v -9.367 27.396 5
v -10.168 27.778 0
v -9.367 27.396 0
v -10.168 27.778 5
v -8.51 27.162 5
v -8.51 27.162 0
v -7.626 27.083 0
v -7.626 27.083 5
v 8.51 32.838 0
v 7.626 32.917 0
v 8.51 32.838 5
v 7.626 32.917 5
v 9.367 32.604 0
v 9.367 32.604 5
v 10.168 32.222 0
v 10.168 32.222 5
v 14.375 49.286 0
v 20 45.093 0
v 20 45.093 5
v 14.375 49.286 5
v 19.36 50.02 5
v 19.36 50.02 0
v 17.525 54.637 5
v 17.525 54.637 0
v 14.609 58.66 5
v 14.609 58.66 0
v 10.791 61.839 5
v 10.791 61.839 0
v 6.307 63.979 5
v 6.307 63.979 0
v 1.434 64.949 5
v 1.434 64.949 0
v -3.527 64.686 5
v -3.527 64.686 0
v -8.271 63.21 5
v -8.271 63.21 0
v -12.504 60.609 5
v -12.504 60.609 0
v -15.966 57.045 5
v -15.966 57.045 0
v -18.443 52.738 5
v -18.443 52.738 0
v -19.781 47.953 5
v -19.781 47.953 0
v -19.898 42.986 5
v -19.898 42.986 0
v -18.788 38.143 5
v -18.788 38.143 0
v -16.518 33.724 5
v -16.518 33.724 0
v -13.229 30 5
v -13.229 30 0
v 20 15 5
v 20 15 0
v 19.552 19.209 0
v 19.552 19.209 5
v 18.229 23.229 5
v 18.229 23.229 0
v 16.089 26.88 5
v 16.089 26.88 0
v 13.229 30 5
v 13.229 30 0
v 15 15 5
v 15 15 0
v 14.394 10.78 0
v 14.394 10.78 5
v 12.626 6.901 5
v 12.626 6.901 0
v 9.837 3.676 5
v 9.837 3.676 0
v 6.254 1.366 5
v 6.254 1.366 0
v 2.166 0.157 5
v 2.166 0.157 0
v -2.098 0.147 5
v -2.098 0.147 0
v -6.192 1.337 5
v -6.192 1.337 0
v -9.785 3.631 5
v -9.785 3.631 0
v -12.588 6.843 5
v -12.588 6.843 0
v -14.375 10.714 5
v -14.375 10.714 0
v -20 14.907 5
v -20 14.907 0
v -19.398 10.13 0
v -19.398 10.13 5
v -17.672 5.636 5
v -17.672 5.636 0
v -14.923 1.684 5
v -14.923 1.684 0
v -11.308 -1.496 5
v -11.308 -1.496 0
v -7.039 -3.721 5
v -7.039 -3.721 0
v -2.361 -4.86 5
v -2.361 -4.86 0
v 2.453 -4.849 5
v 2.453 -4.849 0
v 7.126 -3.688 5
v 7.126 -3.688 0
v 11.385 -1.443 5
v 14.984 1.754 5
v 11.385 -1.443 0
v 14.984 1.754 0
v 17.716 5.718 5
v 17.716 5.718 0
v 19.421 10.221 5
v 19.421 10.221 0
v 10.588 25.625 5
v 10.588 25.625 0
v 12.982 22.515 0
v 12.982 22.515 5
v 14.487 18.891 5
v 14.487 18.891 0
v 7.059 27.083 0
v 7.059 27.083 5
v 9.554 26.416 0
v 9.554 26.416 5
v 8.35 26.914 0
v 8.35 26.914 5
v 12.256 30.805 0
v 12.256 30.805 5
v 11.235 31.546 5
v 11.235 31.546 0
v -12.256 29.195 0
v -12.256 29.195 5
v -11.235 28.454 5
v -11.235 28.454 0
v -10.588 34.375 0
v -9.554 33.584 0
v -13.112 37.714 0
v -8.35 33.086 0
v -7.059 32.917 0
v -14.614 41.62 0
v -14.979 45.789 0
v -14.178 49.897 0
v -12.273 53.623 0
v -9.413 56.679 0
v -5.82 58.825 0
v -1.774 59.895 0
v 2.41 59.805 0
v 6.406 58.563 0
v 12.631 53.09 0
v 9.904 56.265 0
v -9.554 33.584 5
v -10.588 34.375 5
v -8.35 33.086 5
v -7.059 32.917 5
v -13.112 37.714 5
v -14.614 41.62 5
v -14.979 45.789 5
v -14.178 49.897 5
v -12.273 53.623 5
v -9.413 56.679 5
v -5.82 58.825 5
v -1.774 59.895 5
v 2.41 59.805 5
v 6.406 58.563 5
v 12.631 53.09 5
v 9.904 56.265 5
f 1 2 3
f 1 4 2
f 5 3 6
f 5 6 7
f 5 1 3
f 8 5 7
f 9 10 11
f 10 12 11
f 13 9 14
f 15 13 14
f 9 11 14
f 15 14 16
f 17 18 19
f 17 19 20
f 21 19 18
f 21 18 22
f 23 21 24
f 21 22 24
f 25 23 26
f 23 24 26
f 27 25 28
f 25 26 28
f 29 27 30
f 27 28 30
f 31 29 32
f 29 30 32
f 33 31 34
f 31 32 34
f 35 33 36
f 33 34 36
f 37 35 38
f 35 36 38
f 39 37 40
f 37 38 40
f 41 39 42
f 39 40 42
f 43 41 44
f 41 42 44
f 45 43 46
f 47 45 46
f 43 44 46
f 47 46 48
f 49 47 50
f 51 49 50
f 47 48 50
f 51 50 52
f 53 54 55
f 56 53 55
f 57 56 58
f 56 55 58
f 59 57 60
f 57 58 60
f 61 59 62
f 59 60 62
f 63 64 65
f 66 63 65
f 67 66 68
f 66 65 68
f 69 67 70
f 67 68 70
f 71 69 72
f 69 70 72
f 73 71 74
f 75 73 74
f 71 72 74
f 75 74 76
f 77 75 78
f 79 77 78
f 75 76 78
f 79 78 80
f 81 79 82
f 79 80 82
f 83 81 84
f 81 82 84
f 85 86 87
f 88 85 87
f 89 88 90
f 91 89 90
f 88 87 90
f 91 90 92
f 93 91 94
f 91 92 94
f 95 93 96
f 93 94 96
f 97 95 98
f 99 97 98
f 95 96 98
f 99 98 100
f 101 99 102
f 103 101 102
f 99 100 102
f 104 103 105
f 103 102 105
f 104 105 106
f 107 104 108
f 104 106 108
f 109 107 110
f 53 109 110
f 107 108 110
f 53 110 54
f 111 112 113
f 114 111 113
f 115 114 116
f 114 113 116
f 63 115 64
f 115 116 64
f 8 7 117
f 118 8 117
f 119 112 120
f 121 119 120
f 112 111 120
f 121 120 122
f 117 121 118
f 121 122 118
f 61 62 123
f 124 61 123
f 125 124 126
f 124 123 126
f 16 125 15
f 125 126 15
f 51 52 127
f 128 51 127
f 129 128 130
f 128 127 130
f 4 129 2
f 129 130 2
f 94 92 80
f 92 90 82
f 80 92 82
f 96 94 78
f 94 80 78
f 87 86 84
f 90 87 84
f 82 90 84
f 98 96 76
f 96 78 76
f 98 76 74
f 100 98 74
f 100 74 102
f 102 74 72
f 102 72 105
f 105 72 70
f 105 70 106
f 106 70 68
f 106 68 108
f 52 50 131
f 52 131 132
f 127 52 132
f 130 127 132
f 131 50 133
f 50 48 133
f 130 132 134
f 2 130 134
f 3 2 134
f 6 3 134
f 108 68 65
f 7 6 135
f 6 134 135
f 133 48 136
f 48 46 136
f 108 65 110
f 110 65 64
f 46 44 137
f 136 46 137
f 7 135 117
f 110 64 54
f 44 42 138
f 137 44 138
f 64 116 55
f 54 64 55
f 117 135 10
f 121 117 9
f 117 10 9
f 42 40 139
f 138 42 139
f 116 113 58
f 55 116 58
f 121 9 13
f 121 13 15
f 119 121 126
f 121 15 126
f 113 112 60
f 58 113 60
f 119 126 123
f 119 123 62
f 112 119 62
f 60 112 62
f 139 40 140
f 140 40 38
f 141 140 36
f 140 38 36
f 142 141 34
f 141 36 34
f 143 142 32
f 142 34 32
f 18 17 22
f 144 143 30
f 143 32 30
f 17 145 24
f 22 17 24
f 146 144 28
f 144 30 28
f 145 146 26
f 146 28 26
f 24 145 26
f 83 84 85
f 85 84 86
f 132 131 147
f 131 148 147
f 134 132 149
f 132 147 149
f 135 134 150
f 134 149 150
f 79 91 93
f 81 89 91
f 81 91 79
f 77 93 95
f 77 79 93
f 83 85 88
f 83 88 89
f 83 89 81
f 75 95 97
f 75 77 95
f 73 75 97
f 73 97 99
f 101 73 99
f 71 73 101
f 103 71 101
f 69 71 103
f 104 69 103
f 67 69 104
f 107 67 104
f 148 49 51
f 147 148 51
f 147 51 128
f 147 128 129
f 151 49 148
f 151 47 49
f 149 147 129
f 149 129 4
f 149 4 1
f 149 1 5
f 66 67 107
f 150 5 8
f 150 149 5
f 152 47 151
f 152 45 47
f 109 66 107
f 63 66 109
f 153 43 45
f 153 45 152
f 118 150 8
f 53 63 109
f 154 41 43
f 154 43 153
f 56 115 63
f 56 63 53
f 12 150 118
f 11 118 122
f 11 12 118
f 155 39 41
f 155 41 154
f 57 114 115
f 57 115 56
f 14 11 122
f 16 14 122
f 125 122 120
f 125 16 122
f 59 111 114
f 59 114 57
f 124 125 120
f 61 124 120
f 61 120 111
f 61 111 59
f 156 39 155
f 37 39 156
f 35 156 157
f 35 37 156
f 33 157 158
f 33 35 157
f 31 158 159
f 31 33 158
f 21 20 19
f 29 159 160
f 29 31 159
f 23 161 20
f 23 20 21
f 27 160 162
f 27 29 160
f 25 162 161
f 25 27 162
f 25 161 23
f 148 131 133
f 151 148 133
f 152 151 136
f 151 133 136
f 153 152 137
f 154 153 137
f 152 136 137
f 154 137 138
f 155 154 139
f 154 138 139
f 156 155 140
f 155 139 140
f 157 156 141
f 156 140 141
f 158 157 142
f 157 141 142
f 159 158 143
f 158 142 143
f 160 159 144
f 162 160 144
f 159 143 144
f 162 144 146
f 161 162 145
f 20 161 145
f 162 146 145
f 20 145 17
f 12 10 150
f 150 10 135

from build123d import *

# Parameters (mm, degrees)
F1_DEPTH    = 5
F2_T1_DEPTH = 31.594870106
F3_R        = 5


# Not quite as in the source:
# - a fillet or chamfer that OpenCascade refuses, or shapes differently, is made with other operations: its cross-section is extruded or revolved along the edge and cut away or added


with BuildPart() as f1:
    # F0 (on Top) → F1 (new body)
    with BuildSketch(Plane.XY):
        with BuildLine():
            ThreePointArc((20, 45), (-8.2287565553, 63.2287565553), (-13.2287565553, 30))
            ThreePointArc((-13.2287565553, 30), (-11.1540260033, 31.6008344344), (-8.8878037532, 32.9166666667))
            ThreePointArc((-8.8878037532, 32.9166666667), (-14.2521928137, 49.6770717335), (0, 60))
            ThreePointArc((0, 60), (10.6066017178, 55.6066017178), (15, 45))
            Line((15, 45), (20, 45))
        make_face()
        with BuildLine():
            ThreePointArc((-13.2287565553, 30), (-11.1540260033, 28.3991655656), (-8.8878037532, 27.0833333333))
            ThreePointArc((-8.8878037532, 27.0833333333), (-4.6770717335, 29.2521928137), (0, 30))
            ThreePointArc((0, 30), (-4.6770717335, 30.7478071863), (-8.8878037532, 32.9166666667))
            ThreePointArc((-8.8878037532, 32.9166666667), (-11.1540260033, 31.6008344344), (-13.2287565553, 30))
        make_face()
        with BuildLine():
            ThreePointArc((-8.8878037532, 32.9166666667), (-4.6770717335, 30.7478071863), (0, 30))
            Line((0, 30), (0, 32.9166666667))
            Line((0, 32.9166666667), (-8.8878037532, 32.9166666667))
        make_face()
        with BuildLine():
            ThreePointArc((0, 30), (-4.6770717335, 29.2521928137), (-8.8878037532, 27.0833333333))
            Line((-8.8878037532, 27.0833333333), (0, 27.0833333333))
            Line((0, 27.0833333333), (0, 30))
        make_face()
        with BuildLine():
            Line((0, 27.0833333333), (8.8878037532, 27.0833333333))
            ThreePointArc((8.8878037532, 27.0833333333), (4.6770717335, 29.2521928137), (0, 30))
            Line((0, 30), (0, 27.0833333333))
        make_face()
        with BuildLine():
            Line((0, 32.9166666667), (0, 30))
            ThreePointArc((0, 30), (4.6770717335, 30.7478071863), (8.8878037532, 32.9166666667))
            Line((8.8878037532, 32.9166666667), (0, 32.9166666667))
        make_face()
        with BuildLine():
            ThreePointArc((0, 30), (4.6770717335, 29.2521928137), (8.8878037532, 27.0833333333))
            ThreePointArc((8.8878037532, 27.0833333333), (11.1540260033, 28.3991655656), (13.2287565553, 30))
            ThreePointArc((13.2287565553, 30), (11.1540260033, 31.6008344344), (8.8878037532, 32.9166666667))
            ThreePointArc((8.8878037532, 32.9166666667), (4.6770717335, 30.7478071863), (0, 30))
        make_face()
        with BuildLine():
            ThreePointArc((15, 15), (10.6066017178, 4.3933982822), (0, 0))
            ThreePointArc((0, 0), (-10.6066017178, 4.3933982822), (-15, 15))
            Line((-15, 15), (-20, 15))
            ThreePointArc((-20, 15), (0, -5), (20, 15))
            ThreePointArc((20, 15), (18.2287565553, 23.2287565553), (13.2287565553, 30))
            ThreePointArc((13.2287565553, 30), (11.1540260033, 28.3991655656), (8.8878037532, 27.0833333333))
            ThreePointArc((8.8878037532, 27.0833333333), (13.3850113242, 21.7706330465), (15, 15))
        make_face()
    extrude(amount=F1_DEPTH)

    # F2: chamfer of 6 on 2 edges, made by hand

    # F2_s2 → F2_t1 (cut)
    with BuildSketch(Plane.XY.offset(-13.297435053)):
        with BuildLine():
            Line((-14.3747227125, 10.7142857143), (-20.1246117975, 15))
            Line((-20.1246117975, 15), (-15, 15))
            ThreePointArc((-15, 15), (-14.830161389, 12.7491527872), (-14.3747227125, 10.7142857143))
        make_face()
        with BuildLine():
            Line((20.1246117975, 45), (14.3747227125, 49.2857142857))
            ThreePointArc((14.3747227125, 49.2857142857), (14.830161389, 47.2508472128), (15, 45))
            Line((15, 45), (20.1246117975, 45))
        make_face()
    extrude(amount=F2_T1_DEPTH, mode=Mode.SUBTRACT)

    # F3
    f3_edges = [f1.edges().sort_by_distance(p)[0] for p in [
        (-8.887804, 32.916667, 2.5),
        (8.887804, 27.083333, 2.5),
        (8.887804, 32.916667, 2.5),
        (-8.887804, 27.083333, 2.5),
    ]]
    fillet(f3_edges, radius=F3_R)


solid = f1.part
